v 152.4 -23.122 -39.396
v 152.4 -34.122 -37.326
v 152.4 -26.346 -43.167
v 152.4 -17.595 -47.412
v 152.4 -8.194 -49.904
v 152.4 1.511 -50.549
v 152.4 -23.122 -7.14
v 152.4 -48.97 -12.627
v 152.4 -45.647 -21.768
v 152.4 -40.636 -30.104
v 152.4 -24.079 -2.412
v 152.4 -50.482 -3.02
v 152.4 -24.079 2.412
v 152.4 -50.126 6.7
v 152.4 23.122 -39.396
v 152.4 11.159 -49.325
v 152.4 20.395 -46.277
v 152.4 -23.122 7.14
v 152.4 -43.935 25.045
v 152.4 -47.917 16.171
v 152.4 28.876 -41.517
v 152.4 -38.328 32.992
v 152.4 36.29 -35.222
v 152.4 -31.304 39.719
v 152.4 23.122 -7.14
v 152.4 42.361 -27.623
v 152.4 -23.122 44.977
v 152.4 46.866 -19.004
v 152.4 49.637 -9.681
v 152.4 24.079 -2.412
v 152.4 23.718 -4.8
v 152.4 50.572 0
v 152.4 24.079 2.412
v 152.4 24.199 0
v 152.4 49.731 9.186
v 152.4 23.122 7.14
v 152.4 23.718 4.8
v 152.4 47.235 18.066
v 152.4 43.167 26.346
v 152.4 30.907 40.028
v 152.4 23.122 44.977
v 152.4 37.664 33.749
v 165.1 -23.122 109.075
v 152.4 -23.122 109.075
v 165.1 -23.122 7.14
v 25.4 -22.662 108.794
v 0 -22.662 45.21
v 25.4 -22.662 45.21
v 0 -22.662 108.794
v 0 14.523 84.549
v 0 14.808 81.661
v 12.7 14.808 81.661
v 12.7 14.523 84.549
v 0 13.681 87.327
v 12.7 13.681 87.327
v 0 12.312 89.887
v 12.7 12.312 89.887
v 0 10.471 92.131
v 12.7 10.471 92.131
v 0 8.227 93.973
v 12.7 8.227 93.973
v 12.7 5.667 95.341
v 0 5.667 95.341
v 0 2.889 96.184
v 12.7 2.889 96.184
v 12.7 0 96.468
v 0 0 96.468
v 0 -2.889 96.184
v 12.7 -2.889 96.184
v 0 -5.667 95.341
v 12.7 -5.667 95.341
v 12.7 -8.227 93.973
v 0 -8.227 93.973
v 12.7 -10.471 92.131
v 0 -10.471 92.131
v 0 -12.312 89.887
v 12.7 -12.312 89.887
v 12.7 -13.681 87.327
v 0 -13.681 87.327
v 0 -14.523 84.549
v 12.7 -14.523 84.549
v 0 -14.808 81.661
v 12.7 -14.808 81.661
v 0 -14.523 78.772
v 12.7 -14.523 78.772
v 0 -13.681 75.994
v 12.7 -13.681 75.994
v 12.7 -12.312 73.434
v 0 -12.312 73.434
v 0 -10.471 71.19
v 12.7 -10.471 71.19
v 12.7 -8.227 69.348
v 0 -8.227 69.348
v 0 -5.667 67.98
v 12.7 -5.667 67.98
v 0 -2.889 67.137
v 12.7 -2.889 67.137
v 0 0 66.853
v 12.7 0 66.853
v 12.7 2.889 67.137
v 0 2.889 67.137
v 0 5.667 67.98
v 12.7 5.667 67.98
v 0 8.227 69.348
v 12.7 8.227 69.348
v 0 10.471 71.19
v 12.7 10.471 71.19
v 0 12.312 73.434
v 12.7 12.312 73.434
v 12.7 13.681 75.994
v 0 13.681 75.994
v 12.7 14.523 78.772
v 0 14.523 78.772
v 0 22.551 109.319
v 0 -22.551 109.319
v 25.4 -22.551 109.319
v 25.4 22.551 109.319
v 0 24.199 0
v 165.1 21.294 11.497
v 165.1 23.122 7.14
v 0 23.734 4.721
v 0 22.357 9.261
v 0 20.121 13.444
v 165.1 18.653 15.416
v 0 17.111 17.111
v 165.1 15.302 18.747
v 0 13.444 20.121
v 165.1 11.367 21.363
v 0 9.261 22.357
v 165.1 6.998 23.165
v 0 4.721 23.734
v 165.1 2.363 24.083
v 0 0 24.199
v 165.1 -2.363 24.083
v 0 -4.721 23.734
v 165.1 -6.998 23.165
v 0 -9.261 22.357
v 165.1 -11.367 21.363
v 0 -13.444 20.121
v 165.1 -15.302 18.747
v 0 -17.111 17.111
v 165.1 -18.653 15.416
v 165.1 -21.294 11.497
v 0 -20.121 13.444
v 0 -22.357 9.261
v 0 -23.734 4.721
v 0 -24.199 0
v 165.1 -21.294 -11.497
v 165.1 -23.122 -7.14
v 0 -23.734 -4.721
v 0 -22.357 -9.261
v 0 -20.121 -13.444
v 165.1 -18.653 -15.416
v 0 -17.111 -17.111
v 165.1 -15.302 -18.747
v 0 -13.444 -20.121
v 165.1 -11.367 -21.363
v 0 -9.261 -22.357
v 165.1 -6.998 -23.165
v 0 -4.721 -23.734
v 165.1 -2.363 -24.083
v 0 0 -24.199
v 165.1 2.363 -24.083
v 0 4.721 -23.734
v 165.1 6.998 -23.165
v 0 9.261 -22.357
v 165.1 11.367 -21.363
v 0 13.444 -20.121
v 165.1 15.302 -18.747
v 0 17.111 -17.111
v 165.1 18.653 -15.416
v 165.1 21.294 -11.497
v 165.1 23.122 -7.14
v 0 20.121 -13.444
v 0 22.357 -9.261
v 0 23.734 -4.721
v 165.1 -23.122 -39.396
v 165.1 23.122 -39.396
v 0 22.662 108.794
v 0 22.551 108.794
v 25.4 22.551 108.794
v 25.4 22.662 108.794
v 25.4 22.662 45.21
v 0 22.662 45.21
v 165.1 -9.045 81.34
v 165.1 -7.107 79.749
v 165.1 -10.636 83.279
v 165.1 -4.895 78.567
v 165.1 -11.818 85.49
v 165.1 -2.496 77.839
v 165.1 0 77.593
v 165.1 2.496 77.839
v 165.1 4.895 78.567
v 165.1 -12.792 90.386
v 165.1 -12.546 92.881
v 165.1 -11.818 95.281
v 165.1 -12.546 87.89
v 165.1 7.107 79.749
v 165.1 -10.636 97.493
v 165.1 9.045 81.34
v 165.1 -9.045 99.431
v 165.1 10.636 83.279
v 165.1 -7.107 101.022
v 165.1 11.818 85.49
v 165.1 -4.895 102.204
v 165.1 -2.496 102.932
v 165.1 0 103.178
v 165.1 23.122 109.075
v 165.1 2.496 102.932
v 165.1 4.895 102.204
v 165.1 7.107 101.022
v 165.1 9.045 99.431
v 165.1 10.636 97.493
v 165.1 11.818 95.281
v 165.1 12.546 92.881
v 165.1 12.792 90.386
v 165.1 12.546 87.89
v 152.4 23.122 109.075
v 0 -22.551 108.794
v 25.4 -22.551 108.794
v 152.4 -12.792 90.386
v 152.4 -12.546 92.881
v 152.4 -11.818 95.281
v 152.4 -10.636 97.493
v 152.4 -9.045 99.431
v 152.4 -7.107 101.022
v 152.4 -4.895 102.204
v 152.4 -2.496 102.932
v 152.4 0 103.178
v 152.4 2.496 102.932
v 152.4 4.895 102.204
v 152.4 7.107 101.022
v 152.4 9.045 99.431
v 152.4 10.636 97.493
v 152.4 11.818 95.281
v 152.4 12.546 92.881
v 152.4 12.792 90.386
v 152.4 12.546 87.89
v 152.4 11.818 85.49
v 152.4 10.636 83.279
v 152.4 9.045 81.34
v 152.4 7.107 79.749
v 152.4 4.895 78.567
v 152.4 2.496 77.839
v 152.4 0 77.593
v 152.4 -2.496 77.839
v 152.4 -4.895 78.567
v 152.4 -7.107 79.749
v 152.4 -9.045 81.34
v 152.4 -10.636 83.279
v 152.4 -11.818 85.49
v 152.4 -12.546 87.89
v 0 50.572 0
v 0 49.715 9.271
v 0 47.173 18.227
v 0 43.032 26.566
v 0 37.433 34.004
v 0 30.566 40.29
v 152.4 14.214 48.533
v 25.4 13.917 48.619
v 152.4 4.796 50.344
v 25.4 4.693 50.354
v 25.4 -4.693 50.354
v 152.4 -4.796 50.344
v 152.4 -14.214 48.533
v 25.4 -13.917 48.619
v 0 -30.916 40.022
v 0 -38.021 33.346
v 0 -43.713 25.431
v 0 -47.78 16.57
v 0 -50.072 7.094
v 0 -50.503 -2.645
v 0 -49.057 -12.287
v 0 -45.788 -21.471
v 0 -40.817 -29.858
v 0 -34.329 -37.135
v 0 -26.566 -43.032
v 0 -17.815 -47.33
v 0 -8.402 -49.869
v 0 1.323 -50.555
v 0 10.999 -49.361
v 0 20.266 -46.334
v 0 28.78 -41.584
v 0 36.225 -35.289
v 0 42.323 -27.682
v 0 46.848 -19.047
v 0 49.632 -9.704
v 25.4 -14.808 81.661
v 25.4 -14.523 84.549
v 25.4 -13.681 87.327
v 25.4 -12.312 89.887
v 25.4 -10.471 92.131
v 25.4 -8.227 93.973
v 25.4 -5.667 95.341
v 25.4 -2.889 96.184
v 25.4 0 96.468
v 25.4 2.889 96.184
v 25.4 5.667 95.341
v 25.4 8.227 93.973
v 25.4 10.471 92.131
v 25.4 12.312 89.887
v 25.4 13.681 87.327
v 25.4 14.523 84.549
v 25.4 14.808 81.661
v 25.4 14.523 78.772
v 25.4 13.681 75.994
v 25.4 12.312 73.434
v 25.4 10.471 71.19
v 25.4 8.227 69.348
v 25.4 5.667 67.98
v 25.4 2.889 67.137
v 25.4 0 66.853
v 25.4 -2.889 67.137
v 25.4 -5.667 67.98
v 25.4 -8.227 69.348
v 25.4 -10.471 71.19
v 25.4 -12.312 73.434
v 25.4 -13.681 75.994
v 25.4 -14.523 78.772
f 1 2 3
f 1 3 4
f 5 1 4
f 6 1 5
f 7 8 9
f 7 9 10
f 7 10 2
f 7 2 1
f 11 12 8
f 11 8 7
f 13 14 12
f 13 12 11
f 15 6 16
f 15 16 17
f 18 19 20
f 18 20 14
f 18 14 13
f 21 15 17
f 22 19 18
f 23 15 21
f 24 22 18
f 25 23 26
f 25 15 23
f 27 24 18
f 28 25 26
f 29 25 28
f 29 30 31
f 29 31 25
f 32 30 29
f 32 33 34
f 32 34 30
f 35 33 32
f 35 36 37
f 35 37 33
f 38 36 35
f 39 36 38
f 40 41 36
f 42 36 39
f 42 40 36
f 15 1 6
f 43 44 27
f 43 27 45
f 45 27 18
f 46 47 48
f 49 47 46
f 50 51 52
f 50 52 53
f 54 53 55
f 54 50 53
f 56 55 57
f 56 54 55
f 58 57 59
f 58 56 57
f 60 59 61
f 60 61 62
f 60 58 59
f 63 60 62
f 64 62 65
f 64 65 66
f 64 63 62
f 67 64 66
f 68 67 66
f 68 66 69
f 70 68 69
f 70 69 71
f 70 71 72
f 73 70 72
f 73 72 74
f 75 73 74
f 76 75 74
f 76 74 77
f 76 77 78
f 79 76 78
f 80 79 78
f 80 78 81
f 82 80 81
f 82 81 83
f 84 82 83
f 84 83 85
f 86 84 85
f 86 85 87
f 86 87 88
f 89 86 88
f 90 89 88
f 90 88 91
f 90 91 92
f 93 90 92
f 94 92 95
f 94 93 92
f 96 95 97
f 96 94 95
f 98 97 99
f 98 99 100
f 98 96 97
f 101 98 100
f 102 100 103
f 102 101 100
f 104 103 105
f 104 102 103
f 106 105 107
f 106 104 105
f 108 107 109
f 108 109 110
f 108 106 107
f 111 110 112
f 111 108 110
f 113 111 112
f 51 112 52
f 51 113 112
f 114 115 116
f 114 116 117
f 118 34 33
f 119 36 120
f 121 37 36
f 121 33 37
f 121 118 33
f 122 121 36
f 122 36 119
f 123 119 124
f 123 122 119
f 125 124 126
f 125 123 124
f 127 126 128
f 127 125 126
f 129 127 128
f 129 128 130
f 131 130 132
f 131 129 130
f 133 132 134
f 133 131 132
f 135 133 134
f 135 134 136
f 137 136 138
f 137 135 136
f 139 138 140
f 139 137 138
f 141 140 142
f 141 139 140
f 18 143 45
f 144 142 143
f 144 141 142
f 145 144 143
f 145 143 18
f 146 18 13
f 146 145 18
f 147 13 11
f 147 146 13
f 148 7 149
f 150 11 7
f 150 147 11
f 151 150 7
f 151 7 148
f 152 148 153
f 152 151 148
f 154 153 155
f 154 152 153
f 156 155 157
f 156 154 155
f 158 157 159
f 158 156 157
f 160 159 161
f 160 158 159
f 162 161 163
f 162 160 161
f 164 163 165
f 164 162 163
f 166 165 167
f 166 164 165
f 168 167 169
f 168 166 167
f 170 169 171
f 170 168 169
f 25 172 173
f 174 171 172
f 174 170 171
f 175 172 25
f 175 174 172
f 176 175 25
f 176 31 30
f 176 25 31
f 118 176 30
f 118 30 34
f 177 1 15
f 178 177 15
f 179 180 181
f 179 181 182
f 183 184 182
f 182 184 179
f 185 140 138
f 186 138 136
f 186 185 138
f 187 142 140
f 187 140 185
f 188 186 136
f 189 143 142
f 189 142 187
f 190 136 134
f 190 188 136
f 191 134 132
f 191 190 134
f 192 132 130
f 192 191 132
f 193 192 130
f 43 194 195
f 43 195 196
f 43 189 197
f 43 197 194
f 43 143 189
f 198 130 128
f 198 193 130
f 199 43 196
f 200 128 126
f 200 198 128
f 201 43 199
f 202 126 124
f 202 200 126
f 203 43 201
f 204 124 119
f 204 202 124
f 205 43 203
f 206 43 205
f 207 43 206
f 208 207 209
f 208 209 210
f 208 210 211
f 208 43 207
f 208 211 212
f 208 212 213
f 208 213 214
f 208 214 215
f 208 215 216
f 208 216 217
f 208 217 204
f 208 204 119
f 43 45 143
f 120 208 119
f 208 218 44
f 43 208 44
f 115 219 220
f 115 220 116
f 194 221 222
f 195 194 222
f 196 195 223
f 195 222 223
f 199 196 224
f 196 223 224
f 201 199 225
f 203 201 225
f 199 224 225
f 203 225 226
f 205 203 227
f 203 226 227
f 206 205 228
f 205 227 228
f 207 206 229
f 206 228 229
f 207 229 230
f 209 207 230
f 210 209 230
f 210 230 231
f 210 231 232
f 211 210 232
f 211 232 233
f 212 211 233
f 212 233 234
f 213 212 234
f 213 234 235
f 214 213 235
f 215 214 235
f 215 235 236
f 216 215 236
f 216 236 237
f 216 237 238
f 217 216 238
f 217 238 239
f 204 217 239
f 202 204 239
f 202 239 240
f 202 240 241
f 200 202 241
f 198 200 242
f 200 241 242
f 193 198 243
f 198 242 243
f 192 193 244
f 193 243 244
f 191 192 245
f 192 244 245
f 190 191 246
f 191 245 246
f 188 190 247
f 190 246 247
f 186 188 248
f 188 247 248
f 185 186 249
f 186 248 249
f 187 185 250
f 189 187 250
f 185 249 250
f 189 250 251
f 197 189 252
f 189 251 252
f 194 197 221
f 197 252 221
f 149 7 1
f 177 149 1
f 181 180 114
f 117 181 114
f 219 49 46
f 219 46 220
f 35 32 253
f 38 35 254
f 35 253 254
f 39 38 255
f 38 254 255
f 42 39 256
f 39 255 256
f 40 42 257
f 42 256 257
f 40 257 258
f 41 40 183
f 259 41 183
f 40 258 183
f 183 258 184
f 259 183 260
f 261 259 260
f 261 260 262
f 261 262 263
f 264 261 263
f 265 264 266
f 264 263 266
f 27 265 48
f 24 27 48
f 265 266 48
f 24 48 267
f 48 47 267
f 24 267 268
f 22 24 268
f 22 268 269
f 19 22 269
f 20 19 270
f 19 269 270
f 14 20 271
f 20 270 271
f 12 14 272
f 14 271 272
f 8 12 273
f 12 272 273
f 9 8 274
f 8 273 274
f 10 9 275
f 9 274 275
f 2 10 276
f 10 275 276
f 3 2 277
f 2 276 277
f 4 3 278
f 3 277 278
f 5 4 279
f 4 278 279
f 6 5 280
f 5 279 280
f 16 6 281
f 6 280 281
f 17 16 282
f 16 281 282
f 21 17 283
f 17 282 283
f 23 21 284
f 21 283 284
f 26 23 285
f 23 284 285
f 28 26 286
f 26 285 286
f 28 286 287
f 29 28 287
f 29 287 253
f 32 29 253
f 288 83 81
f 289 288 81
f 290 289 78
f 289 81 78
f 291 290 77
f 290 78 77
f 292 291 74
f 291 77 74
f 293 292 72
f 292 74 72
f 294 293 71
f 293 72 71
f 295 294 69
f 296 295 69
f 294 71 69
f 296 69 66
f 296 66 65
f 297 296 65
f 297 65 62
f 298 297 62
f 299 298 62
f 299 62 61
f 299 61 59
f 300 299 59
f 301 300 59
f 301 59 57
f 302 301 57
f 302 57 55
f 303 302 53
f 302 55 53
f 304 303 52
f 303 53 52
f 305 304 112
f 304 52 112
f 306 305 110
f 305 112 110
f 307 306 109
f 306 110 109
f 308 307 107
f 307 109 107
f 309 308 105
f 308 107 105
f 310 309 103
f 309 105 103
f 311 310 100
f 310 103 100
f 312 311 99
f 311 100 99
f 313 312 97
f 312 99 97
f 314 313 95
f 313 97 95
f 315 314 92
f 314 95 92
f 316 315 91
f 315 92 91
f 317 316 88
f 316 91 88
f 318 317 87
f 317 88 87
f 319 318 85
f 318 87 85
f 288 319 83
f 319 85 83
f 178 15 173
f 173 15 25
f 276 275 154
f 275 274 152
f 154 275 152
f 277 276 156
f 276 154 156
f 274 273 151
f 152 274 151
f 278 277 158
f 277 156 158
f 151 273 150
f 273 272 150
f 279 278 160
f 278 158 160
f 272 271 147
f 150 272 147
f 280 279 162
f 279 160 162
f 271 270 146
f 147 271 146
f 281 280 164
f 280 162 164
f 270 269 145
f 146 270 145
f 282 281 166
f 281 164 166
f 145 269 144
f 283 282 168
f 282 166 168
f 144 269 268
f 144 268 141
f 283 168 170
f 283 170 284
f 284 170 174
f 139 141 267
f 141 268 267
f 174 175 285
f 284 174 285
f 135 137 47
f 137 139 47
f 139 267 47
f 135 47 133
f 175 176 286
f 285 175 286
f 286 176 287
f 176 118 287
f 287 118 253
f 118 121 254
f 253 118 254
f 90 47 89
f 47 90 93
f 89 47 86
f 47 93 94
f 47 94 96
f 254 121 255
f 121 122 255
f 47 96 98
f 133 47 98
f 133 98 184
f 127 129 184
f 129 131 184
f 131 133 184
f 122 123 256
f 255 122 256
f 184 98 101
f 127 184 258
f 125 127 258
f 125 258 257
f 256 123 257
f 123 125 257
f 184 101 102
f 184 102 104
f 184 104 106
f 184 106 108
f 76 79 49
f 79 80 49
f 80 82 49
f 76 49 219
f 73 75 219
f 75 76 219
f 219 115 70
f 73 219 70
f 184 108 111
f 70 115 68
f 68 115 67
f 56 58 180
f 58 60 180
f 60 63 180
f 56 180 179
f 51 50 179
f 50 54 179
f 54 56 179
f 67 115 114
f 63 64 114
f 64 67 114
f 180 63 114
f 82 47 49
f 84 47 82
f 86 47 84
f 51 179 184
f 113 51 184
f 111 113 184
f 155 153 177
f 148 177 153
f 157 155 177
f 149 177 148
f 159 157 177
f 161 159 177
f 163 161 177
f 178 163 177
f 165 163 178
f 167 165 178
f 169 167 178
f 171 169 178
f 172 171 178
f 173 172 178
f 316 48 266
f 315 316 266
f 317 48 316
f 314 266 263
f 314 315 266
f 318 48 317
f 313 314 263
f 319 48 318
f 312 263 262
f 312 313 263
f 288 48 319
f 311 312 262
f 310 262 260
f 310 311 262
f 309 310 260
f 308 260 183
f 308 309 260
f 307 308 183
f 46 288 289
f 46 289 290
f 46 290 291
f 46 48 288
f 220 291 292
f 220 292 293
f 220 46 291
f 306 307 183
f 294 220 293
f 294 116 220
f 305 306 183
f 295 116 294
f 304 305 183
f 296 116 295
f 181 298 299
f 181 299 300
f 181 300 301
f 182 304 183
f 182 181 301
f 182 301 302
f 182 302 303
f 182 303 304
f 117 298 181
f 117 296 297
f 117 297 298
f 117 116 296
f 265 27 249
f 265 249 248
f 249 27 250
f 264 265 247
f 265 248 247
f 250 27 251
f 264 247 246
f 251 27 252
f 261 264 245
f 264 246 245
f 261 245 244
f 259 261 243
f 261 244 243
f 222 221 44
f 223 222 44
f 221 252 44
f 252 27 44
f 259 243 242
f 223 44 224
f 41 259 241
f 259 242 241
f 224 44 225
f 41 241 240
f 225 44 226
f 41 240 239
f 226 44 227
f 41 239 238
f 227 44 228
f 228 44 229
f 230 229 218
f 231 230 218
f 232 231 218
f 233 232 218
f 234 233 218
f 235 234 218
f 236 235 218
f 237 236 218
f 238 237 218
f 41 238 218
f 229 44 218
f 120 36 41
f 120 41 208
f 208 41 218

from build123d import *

# Parameters (mm, degrees)
F0_R      = 50.5719181769
F1_DEPTH  = 152.4
F2_W      = 45.1020896435
F2_H      = 153.3471494913
F3_DEPTH  = 25.4
F4_W      = 45.3240573406
F4_H      = 153.6485850811
F5_DEPTH  = 25.4
F7_DEPTH  = 25.4
F8_R      = 14.8077748838
F7_FACE_W = 46.2437570095
F7_FACE_H = 148.4715342522
F9_DEPTH  = 12.7
F10_R     = 14.8077748838
F11_DEPTH = 25.4
F12_R     = 14.0159592486
F13_DEPTH = 25.4
F14_R     = 12.7922507372
F15_DEPTH = 25.4
F16_R     = 19.6873563426
F17_DEPTH = 177.8
F18_R     = 24.1990782375
F19_DEPTH = 101.6
F20_DEPTH = 25.4
F21_DEPTH = 203.2


with BuildPart() as f1:
    # F0 (on Right) → F1 (new body)
    with BuildSketch(Plane.YZ):
        Circle(F0_R)
    extrude(amount=F1_DEPTH)

    # F2 (on Right) → F3 (join)
    with BuildSketch(Plane.YZ):
        with Locations((0, 32.645329833)):
            Rectangle(F2_W, F2_H)
    extrude(amount=F3_DEPTH)

    # F4 (on Right) → F5 (join)
    with BuildSketch(Plane.YZ):
        with Locations((0, 31.9696366787)):
            Rectangle(F4_W, F4_H)
    extrude(amount=F5_DEPTH)

    # F6 (on face) → F7 (join)
    with BuildSketch(Plane.YZ.offset(152.4)):
        with BuildLine():
            ThreePointArc((23.1218785048, 44.9766344061), (0, 50.5719181769), (-23.1218785048, 44.9766344061))
            Line((-23.1218785048, 44.9766344061), (-23.1218785048, -39.3963605165))
            Line((-23.1218785048, -39.3963605165), (23.1218785048, -39.3963605165))
            Line((23.1218785048, -39.3963605165), (23.1218785048, 44.9766344061))
        make_face()
        with BuildLine():
            Line((23.1218785048, 109.0751737356), (-23.1218785048, 109.0751737356))
            Line((-23.1218785048, 109.0751737356), (-23.1218785048, 44.9766344061))
            ThreePointArc((-23.1218785048, 44.9766344061), (0, 50.5719181769), (23.1218785048, 44.9766344061))
            Line((23.1218785048, 44.9766344061), (23.1218785048, 109.0751737356))
        make_face()
    extrude(amount=F7_DEPTH)

    # F8 (on Right) + F7_face (on face) → F9 (cut, symmetric)
    with BuildSketch(Plane.YZ):
        with Locations((0, 81.6606134176)):
            Circle(F8_R)
    with BuildSketch(Plane(origin=(177.8, 0, 34.8394066095), x_dir=(0, 1, 0), z_dir=(1, 0, 0))):
        Rectangle(F7_FACE_W, F7_FACE_H)
    extrude(amount=F9_DEPTH, both=True, mode=Mode.SUBTRACT)

    # F10 (on face) → F11 (cut)
    with BuildSketch(Plane(origin=(12.7, 0, 0), x_dir=(0, -1, 0), z_dir=(-1, 0, 0))):
        with Locations((0, 81.6606134176)):
            Circle(F10_R)
    extrude(amount=-F11_DEPTH, mode=Mode.SUBTRACT)

    # F12 (on Right) → F13 (cut)
    with BuildSketch(Plane.YZ):
        with Locations((-7.2993179783, 64.5171701908)):
            Circle(F12_R)
    extrude(amount=-F13_DEPTH, mode=Mode.SUBTRACT)

    # F14 (on face) → F15 (cut)
    with BuildSketch(Plane(origin=(152.4, 0, 0), x_dir=(0, -1, 0), z_dir=(-1, 0, 0))):
        with Locations((0, 90.3855785728)):
            Circle(F14_R)
    extrude(amount=-F15_DEPTH, mode=Mode.SUBTRACT)

    # F16 (on Right) → F17 (cut)
    with BuildSketch(Plane.YZ):
        Circle(F16_R)
    extrude(amount=-F17_DEPTH, mode=Mode.SUBTRACT)

    # F18 (on Right) → F19 (cut, symmetric)
    with BuildSketch(Plane.YZ):
        Circle(F18_R)
    extrude(amount=F19_DEPTH, both=True, mode=Mode.SUBTRACT)

    # F20 (cut): a face of the model
    f20_faces = [f1.faces().sort_by_distance(p)[0] for p in [
        (101.6, 0, 0),
    ]]
    extrude(f20_faces, amount=-F20_DEPTH, mode=Mode.SUBTRACT)

    # F21 (cut): a face of the model
    f21_faces = [f1.faces().sort_by_distance(p)[0] for p in [
        (127, 0, 0),
    ]]
    extrude(f21_faces, amount=-F21_DEPTH, mode=Mode.SUBTRACT)


solid = f1.part
